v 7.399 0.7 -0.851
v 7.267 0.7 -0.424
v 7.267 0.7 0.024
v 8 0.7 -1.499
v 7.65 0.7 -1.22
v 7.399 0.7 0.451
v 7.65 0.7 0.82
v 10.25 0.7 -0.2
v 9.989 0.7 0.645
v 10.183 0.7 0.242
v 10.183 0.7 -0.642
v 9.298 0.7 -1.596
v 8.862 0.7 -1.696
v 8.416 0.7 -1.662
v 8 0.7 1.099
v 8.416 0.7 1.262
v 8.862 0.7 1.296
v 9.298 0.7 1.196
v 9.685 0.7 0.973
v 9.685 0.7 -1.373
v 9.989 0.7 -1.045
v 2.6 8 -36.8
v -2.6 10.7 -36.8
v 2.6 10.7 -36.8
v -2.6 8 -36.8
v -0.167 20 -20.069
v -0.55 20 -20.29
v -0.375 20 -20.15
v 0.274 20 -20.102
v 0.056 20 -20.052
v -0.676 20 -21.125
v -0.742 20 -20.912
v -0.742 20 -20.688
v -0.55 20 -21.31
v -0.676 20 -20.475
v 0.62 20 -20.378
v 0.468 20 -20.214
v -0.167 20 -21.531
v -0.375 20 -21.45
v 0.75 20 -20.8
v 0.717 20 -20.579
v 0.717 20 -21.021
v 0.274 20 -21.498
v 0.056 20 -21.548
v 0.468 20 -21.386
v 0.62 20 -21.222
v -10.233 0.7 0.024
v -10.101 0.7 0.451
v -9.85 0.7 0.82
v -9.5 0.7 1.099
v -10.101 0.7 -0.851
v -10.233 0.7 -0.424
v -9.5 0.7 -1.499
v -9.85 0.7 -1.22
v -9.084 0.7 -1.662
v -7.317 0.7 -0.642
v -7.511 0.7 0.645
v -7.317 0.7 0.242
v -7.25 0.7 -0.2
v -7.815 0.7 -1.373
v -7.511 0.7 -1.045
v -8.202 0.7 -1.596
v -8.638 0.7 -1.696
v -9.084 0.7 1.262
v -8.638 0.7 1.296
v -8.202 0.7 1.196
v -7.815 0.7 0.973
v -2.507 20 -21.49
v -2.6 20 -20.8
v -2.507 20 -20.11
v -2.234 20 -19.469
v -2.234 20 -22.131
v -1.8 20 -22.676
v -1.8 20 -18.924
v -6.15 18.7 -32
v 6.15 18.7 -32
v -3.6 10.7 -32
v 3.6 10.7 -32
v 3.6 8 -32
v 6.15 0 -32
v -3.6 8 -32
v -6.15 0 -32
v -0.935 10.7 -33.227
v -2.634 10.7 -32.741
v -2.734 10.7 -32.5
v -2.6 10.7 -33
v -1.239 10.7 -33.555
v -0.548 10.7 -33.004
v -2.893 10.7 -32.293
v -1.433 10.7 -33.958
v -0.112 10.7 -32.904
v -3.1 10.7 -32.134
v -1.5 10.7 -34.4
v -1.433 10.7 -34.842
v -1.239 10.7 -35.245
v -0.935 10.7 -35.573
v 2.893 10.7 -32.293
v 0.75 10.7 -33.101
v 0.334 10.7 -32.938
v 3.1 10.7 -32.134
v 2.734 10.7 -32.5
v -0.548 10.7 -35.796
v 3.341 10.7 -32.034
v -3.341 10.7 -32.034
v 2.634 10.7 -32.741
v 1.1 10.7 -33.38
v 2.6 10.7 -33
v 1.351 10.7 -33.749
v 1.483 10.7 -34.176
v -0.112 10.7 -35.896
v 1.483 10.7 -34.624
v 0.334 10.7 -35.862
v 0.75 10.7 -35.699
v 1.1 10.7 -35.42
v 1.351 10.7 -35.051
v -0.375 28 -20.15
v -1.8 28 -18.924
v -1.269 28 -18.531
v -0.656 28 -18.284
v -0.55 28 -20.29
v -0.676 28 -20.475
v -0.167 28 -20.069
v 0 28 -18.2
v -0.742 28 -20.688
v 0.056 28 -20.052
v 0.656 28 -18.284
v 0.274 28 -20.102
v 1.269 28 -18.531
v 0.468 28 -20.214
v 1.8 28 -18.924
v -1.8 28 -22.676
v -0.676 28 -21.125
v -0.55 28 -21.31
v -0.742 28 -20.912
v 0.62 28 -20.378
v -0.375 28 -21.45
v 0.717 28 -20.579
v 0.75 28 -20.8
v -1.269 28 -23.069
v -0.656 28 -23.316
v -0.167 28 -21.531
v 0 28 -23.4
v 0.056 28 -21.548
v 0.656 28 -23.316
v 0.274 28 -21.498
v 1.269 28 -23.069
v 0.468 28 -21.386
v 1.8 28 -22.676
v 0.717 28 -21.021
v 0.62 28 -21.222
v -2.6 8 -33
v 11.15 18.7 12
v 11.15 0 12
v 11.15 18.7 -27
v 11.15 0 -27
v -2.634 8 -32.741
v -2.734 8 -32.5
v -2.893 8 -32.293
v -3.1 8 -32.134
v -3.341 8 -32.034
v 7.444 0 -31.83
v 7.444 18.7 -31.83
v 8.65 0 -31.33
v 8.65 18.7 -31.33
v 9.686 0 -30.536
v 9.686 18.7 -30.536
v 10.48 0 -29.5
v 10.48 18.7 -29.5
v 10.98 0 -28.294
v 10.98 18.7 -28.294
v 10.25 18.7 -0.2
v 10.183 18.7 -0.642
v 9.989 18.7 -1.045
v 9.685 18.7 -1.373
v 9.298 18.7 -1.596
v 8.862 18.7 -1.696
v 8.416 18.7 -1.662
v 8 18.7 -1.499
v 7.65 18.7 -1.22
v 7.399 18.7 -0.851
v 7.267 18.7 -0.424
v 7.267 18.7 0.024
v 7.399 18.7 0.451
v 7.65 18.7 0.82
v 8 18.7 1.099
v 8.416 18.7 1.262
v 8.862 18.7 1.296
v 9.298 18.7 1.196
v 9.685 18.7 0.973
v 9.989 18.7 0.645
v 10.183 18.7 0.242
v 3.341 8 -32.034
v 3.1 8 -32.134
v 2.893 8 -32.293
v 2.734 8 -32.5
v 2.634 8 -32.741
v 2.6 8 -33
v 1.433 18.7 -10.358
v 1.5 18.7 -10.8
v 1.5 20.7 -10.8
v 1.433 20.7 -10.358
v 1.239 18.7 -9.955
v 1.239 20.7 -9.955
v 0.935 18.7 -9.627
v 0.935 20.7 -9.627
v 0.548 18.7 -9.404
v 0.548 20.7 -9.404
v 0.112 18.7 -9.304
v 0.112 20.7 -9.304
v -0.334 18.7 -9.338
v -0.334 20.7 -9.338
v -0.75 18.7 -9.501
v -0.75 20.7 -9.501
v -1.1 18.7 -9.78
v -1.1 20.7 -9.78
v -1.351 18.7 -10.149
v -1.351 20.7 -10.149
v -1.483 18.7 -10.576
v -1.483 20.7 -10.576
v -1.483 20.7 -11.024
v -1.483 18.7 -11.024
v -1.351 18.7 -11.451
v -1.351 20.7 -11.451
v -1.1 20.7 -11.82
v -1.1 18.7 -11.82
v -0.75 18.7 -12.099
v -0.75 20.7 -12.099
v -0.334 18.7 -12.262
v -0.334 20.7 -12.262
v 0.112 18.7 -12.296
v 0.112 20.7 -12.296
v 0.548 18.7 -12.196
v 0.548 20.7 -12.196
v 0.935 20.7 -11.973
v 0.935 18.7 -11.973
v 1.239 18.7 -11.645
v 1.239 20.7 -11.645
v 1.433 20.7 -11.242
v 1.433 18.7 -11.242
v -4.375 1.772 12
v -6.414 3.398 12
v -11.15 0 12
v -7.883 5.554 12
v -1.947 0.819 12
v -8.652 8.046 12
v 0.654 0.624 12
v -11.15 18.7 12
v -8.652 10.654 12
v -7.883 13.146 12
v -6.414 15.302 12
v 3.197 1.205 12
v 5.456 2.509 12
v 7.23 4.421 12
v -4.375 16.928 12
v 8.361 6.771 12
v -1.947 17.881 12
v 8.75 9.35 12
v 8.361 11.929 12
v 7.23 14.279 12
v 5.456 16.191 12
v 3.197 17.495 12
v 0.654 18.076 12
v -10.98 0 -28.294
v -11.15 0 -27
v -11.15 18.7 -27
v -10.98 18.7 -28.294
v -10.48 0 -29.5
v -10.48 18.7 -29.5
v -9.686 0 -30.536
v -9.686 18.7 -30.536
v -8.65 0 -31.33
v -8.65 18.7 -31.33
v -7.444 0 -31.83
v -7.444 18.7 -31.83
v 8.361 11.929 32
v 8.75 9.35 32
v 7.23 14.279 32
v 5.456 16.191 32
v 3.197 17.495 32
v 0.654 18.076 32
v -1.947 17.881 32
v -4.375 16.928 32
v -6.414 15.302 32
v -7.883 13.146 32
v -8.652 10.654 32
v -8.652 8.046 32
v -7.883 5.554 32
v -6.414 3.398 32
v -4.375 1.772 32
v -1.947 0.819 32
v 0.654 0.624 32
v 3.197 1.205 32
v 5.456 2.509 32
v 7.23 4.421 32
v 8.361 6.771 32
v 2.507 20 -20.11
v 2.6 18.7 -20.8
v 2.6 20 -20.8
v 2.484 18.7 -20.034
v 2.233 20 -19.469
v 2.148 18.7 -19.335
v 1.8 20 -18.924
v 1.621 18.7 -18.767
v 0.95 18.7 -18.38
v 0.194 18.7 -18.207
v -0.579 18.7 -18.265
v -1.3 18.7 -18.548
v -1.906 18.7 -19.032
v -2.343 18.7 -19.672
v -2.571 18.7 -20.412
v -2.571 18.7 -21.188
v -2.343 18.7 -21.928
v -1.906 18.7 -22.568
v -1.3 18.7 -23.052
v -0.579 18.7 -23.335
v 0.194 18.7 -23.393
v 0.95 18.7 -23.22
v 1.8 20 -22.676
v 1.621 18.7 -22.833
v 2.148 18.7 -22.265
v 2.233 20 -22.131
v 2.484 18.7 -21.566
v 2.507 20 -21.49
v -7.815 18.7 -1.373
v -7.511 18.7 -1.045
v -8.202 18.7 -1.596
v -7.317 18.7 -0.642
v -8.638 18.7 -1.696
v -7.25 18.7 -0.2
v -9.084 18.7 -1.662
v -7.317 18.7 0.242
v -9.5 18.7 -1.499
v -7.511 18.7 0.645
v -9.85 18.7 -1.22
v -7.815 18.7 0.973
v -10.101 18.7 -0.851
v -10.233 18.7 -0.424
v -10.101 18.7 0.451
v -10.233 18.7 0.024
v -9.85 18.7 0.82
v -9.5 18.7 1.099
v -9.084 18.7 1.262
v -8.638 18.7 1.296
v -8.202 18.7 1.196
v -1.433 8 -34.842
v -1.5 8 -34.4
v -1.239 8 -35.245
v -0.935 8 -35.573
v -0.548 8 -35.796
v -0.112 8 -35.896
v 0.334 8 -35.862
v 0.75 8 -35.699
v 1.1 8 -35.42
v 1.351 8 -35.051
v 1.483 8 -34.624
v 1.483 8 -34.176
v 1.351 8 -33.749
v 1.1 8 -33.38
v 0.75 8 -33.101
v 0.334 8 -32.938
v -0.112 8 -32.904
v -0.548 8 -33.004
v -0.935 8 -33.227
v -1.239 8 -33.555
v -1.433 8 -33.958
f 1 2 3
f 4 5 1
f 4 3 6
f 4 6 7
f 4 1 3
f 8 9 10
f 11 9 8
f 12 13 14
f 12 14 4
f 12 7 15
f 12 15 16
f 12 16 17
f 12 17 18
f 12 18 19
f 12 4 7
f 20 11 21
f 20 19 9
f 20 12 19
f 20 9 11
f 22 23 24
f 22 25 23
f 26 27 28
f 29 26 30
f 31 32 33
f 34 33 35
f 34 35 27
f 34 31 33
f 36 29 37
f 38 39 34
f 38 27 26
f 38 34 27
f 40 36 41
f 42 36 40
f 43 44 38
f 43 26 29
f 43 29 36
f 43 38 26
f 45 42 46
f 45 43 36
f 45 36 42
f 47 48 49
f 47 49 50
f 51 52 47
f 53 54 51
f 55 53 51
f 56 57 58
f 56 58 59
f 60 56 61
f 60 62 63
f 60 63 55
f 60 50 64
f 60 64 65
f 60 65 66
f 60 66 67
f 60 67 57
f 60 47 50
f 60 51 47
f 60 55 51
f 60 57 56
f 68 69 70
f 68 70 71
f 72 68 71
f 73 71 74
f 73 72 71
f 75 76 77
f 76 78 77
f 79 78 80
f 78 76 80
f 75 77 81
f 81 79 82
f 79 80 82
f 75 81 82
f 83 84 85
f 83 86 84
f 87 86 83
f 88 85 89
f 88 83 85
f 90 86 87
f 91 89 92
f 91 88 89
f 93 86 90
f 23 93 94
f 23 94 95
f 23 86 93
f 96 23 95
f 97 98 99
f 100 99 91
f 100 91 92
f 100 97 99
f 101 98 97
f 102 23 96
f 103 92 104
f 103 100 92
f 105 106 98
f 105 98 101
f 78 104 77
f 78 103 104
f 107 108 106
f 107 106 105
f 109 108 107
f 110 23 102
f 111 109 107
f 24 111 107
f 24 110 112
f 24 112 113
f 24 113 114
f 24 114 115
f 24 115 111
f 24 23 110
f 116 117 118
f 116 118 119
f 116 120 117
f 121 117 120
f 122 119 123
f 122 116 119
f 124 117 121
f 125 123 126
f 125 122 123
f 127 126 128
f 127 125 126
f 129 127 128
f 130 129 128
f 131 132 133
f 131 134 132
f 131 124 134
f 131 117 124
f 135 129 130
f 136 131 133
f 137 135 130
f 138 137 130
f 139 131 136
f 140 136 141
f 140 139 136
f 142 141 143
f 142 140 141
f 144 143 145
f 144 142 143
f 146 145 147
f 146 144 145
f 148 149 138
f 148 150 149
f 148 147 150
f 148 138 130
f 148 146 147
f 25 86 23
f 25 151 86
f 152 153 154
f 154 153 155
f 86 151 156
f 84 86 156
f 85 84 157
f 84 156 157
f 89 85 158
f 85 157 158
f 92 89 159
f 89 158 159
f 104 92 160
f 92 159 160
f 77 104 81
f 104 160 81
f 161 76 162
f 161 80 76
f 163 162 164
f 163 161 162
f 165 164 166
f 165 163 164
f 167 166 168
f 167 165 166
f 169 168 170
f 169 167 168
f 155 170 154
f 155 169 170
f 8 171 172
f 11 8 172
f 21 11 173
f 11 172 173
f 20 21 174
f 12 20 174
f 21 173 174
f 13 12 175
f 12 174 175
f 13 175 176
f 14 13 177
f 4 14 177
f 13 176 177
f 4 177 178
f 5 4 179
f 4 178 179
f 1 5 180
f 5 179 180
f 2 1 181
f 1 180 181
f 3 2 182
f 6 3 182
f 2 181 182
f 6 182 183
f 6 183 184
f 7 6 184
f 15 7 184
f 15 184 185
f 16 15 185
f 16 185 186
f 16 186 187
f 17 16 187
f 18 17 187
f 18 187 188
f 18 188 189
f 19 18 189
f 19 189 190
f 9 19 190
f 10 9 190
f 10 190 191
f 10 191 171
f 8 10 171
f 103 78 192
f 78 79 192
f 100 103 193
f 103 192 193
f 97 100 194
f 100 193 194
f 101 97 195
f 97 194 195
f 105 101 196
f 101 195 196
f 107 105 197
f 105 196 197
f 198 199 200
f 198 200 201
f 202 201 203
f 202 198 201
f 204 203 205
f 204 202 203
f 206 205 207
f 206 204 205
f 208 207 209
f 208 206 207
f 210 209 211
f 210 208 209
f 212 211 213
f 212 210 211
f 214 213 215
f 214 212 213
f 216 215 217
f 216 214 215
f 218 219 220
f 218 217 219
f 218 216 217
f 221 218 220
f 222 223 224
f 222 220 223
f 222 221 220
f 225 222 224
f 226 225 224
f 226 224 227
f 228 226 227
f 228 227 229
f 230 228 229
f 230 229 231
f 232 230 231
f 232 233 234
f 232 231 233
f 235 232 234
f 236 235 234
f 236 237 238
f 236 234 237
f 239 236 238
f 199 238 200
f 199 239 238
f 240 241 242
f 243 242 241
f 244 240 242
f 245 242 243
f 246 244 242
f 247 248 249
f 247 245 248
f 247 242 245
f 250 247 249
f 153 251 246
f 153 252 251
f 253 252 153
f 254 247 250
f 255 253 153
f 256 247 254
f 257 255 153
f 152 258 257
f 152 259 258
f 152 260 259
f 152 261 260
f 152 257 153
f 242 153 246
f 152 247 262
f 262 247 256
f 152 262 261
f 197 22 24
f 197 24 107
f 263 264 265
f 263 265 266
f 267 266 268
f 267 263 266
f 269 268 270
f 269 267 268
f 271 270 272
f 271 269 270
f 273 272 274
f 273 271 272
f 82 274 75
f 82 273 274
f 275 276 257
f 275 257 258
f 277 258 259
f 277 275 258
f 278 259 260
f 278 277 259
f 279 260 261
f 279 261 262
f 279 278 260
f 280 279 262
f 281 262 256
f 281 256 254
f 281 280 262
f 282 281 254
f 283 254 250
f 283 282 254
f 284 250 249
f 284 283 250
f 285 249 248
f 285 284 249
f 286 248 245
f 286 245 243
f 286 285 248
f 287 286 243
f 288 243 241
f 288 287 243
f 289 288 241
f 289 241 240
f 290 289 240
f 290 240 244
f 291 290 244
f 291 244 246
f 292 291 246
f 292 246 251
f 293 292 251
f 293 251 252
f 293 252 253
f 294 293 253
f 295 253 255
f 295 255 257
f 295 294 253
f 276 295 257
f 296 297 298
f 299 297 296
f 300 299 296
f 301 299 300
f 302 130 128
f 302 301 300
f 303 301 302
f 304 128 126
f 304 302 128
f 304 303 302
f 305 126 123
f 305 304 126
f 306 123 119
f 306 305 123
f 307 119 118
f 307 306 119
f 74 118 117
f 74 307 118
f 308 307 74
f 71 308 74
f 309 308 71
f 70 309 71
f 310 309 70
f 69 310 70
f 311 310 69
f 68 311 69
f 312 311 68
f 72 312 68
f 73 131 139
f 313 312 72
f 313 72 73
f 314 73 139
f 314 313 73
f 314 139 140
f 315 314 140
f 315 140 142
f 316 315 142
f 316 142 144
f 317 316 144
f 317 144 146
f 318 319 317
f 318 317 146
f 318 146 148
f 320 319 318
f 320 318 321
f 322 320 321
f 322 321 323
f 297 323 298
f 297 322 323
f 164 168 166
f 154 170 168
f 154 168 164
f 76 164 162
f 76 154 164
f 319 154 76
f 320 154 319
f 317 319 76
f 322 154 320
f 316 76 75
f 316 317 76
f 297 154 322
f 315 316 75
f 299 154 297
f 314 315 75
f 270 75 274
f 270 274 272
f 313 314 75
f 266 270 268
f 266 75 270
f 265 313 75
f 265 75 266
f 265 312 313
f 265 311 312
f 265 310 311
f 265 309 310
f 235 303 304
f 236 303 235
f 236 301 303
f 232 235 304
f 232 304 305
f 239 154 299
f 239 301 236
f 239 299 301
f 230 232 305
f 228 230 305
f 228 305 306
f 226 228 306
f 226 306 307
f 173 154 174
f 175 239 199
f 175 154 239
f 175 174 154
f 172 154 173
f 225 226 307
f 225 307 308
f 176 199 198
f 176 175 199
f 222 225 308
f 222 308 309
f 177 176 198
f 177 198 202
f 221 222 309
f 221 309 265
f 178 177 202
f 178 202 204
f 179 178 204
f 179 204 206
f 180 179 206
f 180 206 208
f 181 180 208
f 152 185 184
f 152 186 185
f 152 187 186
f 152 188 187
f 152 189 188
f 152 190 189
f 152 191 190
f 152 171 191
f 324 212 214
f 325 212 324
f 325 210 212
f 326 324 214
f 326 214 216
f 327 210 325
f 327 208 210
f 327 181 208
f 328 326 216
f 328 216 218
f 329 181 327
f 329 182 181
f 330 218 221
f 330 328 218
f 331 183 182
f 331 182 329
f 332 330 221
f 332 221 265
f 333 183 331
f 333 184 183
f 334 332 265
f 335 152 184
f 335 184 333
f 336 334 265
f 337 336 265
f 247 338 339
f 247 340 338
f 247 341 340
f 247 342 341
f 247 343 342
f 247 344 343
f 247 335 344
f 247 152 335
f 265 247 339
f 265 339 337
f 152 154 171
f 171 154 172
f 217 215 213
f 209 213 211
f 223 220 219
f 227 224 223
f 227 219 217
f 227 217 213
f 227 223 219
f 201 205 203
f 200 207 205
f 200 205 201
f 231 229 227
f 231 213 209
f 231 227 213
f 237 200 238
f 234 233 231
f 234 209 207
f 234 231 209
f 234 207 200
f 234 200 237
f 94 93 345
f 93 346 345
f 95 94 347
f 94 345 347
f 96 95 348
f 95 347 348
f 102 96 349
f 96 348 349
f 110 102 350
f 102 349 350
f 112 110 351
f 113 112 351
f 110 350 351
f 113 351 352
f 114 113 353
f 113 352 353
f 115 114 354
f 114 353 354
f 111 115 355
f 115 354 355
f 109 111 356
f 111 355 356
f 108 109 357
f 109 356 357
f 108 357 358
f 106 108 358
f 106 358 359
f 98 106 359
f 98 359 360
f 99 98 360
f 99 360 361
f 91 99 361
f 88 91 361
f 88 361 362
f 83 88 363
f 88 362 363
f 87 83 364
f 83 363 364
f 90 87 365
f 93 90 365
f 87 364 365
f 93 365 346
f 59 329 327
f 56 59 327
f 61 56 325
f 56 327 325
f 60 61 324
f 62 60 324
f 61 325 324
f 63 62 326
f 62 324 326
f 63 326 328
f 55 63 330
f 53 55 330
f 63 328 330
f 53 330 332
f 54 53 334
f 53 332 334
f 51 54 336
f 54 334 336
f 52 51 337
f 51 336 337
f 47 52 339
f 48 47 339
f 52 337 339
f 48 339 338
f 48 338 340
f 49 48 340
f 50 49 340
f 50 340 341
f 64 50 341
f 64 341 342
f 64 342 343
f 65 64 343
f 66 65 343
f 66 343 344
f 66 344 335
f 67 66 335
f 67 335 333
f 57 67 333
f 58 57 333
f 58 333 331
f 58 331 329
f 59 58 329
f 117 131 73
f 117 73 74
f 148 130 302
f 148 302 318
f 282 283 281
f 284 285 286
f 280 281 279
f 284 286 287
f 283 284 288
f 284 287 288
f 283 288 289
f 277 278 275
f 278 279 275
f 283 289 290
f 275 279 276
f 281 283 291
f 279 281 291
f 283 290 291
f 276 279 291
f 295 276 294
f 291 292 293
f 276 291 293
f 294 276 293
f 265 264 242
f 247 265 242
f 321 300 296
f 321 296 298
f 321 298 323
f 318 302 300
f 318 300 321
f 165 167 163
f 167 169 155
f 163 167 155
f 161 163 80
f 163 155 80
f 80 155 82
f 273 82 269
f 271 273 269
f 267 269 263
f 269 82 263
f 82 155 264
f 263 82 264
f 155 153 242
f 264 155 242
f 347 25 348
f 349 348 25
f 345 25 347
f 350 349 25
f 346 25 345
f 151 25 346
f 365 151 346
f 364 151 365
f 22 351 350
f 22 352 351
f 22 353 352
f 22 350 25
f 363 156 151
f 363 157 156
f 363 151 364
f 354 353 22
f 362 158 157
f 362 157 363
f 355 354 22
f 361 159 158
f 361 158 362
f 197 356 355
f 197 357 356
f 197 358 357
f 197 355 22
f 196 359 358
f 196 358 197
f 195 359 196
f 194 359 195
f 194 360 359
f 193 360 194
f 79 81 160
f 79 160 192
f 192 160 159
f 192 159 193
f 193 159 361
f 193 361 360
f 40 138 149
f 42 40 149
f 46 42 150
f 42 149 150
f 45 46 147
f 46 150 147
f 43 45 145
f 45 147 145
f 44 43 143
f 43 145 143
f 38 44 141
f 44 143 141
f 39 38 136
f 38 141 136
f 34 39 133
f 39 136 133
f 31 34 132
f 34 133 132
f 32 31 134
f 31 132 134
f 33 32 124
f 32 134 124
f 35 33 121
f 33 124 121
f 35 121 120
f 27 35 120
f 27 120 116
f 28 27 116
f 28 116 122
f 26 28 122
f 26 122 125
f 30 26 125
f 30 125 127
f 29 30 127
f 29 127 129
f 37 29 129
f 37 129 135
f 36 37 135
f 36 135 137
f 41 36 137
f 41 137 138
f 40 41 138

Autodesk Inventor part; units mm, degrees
ref_plane "YZ Plane" through (0, 0, 0) normal (1, 0, 0) x (0, 1, 0)
ref_plane "XZ Plane" through (0, 0, 0) normal (0, 1, 0) x (-1, 0, 0)
ref_plane "XY Plane" through (0, 0, 0) normal (0, 0, 1) x (1, 0, 0)
sketch "Sketch1" plane through (0, 0, 0) normal (0, 1, 0) x (-1, 0, 0)
  line L0 (11.15, 32) -> (-11.15, 32)
  line L1 (-11.15, 32) -> (-11.15, -27)
  line L2 (11.15, -27) -> (11.15, 32)
  line L3 (11.15, 32) -> (-11.15, -32) construction
  line L4 (-11.15, 32) -> (11.15, -32) construction
  arc A0 (6.15, -32) -> (11.15, -27) centre (6.15, -27) ccw
  arc A1 (-11.15, -27) -> (-6.15, -32) centre (-6.15, -27) ccw
  line L5 (2.5547, -34.4) -> (0, -34.4) construction
  circle A2 centre (0, -34.4) radius 1.5
  line L6 (2.6003, -36.8) -> (-2.6003, -36.8)
  line L7 (-2.6003, -36.8) -> (-2.6003, -33)
  line L8 (2.5547, -32) -> (2.6003, -32)
  line L9 (2.6003, -33) -> (2.6003, -36.8)
  line L10 (2.6003, -36.8) -> (-2.6003, -32) construction
  line L11 (-2.6003, -36.8) -> (1.1023, -33.3826) construction
  line L12 (-6.15, -32) -> (-3.6003, -32)
  line L13 (3.6003, -32) -> (6.15, -32)
  arc A3 (3.6003, -32) -> (2.6003, -33) centre (3.6003, -33) ccw
  arc A4 (-2.6003, -33) -> (-3.6003, -32) centre (-3.6003, -33) ccw
  point P0 (0, 0)
  point P1 (0, -32)
  dimension "d19" = 3
  dimension "d14" = 22.3
  dimension "d15" = 64
  dimension "d16" = 5
  dimension "d17" = 5
  dimension "d18" = 2.4
  dimension "d20" = 1
extrude "Extrusion5" add sketch "Sketch1" along normal blind 18.7
sketch "Sketch5" plane through (0, 18.7, 0) normal (0, 1, 0) x (1, 0, 0)
  arc A0 (-6.15, 32) -> (-11.15, 27) centre (-6.15, 27) ccw construction
  line L0 (-11.15, 27) -> (-11.15, -32) construction
  line L1 (-11.15, -32) -> (11.15, -32) construction
  line L2 (11.15, -32) -> (11.15, 27) construction
  arc A1 (11.15, 27) -> (6.15, 32) centre (6.15, 27) ccw construction
  line L3 (6.15, 32) -> (3.6003, 32) construction
  arc A2 (3.6003, 32) -> (2.6003, 33) centre (3.6003, 33) ccw construction
  line L4 (2.6003, 33) -> (2.6003, 36.8) construction
  line L5 (2.6003, 36.8) -> (-2.6003, 36.8) construction
  line L6 (-2.6003, 36.8) -> (-2.6003, 33) construction
  arc A3 (-2.6003, 33) -> (-3.6003, 32) centre (-3.6003, 33) ccw construction
  line L7 (-3.6003, 32) -> (-6.15, 32) construction
  circle A4 centre (0, 34.4) radius 1.5 construction
  line L8 (-3.6003, 32) -> (-6.15, 32) construction
  line L9 (-6.15, 32) -> (-6.15, 20.8) construction
  circle A5 centre (0, 20.8) radius 2.6
  line L10 (0, 0) -> (0, 39.0389) construction
  line L11 (8.75, 32) -> (-8.75, 32) construction
  line L12 (-4.8752, 32) -> (4.8752, 32) construction
  line L13 (8.75, 32) -> (8.75, 0.2) construction
  circle A6 centre (8.75, 0.2) radius 1.5
  line L14 (-8.75, 32) -> (-8.75, 0.2) construction
  circle A7 centre (-8.75, 0.2) radius 1.5
  point P0 (0, 32)
  dimension "d23" = 11.2
  dimension "d24" = 5.2
  dimension "d29" = 17.5
  dimension "d30" = 31.8
  dimension "d31" = 3
  dimension "d32" = 31.8
  dimension "d33" = 3
extrude "Extrusion6" cut sketch "Sketch5" against normal blind 18 contours A6 | A7
extrude "Extrusion7" add sketch "Sketch5" along normal blind 9.3 contours A5
sketch "Sketch6" plane through (0, 18.7, 0) normal (0, 1, 0) x (1, 0, 0)
  circle A0 centre (0, 20.8) radius 2.6 construction
  line L0 (0, 20.8) -> (0, 10.8) construction
  circle A1 centre (0, 10.8) radius 1.5
  point P0 (0, 0)
  dimension "d38" = 10
  dimension "d39" = 3
extrude "Extrusion8" add sketch "Sketch6" along normal blind 2
sketch "Sketch7" plane through (0, 28, -20.8) normal (0, 1, 0) x (1, 0, 0)
  circle A0 centre (0, 0) radius 2.6 construction
  line L0 (1.8, -1.8762) -> (1.8, 1.8762)
  line L1 (-1.8, 1.8762) -> (-1.8, -1.8762)
  line L2 (-1.3648, -2.213) -> (1.3648, 2.213) construction
  line L3 (1.3648, -2.213) -> (-1.3648, 2.213) construction
  arc A1 (-1.8, 1.8762) -> (-1.8, -1.8762) centre (0, 0) ccw
  circle A2 centre (0, 0) radius 2.6 projected
  arc A3 (1.8, -1.8762) -> (1.8, 1.8762) centre (0, 0) ccw
  point P0 (0, -20.8)
extrude "Extrusion9" cut sketch "Sketch7" against normal blind 8 contours L0 A2 | A1 L1
sketch "Sketch8" plane through (0, 28, 0) normal (0, 1, 0) x (1, 0, 0)
  line L0 (-1.8, 22.6762) -> (-1.8, 18.9238) construction
  arc A0 (-1.8, 18.9238) -> (1.8, 18.9238) centre (0, 20.8) ccw construction
  line L1 (1.8, 18.9238) -> (1.8, 22.6762) construction
  arc A1 (1.8, 22.6762) -> (-1.8, 22.6762) centre (0, 20.8) ccw construction
  circle A2 centre (0, 20.8) radius 0.75
  point P0 (0, 0)
  dimension "d45" = 1.5
extrude "Extrusion10" cut sketch "Sketch8" against normal blind 8
sketch "Sketch9" plane through (-11.15, 0, 32) normal (0, 0, 1) x (1, 0, 0)
  line L0 (0, 0) -> (22.3, 0) construction
  line L1 (22.3, 0) -> (22.3, 18.7) construction
  line L2 (0, 18.7) -> (22.3, 18.7) construction
  line L3 (0, 0) -> (0, 18.7) construction
  circle A0 centre (11.15, 9.35) radius 8.75
  line L4 (0, 0) -> (0, 18.7) projected
  line L5 (0, 0) -> (22.3, 0)
  line L6 (22.3, 0) -> (22.3, 18.7)
  line L7 (22.3, 18.7) -> (0, 18.7)
  line L8 (0, 18.7) -> (0, 0)
  point P0 (11.15, 0)
  dimension "d48" = 17.5
extrude "Extrusion11" cut sketch "Sketch9" against normal blind 20
sketch "Sketch10" plane through (0, 0, 0) normal (0, -1, 0) x (1, 0, 0)
  line L0 (11.15, 12) -> (-11.15, 12) projected
  line L1 (-11.15, -27) -> (-11.15, 12) projected
  arc A0 (-11.15, -27) -> (-6.15, -32) centre (-6.15, -27) ccw projected
  line L2 (-3.6003, -32) -> (-6.15, -32) projected
  arc A1 (-2.6003, -33) -> (-3.6003, -32) centre (-3.6003, -33) ccw projected
  line L3 (-2.6003, -36.8) -> (-2.6003, -33) projected
  line L4 (2.6003, -36.8) -> (-2.6003, -36.8) projected
  line L5 (2.6003, -33) -> (2.6003, -36.8) projected
  arc A2 (3.6003, -32) -> (2.6003, -33) centre (3.6003, -33) ccw projected
  line L6 (6.15, -32) -> (3.6003, -32) projected
  arc A3 (6.15, -32) -> (11.15, -27) centre (6.15, -27) ccw projected
  line L7 (11.15, 12) -> (11.15, -27) projected
  circle A4 centre (0, -34.4) radius 1.5 projected
  arc A5 (-2.6003, -33) -> (-3.6003, -32) centre (-3.6003, -33) ccw projected
  line L8 (-3.6003, -32) -> (3.6003, -32)
  point P0 (0, 0)
extrude "Extrusion12" cut sketch "Sketch10" against normal blind 8 contours A2 L5 L4 L3 A1 L8
sketch "Sketch11" plane through (0, 18.7, 0) normal (0, 1, 0) x (1, 0, 0)
  circle A0 centre (0, 34.4) radius 1.5 projected
  line L0 (-11.15, -12) -> (11.15, -12) projected
  line L1 (11.15, -12) -> (11.15, 27) projected
  arc A1 (11.15, 27) -> (6.15, 32) centre (6.15, 27) ccw projected
  line L2 (6.15, 32) -> (3.6003, 32) projected
  arc A2 (2.6003, 33) -> (3.6003, 32) centre (3.6003, 33) ccw projected
  line L3 (2.6003, 33) -> (2.6003, 36.8) projected
  line L4 (2.6003, 36.8) -> (-2.6003, 36.8) projected
  line L5 (-2.6003, 36.8) -> (-2.6003, 33) projected
  arc A3 (-3.6003, 32) -> (-2.6003, 33) centre (-3.6003, 33) ccw projected
  line L6 (-3.6003, 32) -> (-6.15, 32) projected
  arc A4 (-6.15, 32) -> (-11.15, 27) centre (-6.15, 27) ccw projected
  line L7 (-11.15, 27) -> (-11.15, -12) projected
  circle A5 centre (-8.75, 0.2) radius 1.5 projected
  circle A6 centre (8.75, 0.2) radius 1.5 projected
  circle A7 centre (0, 20.8) radius 2.6 projected
  circle A8 centre (0, 10.8) radius 1.5 projected
  arc A9 (-3.6003, 32) -> (-2.6003, 33) centre (-3.6003, 33) ccw projected
  line L8 (-3.6003, 32) -> (3.6003, 32)
  point P0 (0, 0)
extrude "Extrusion13" cut sketch "Sketch11" against normal blind 8 contours A3 L5 L4 L3 A2 L8
properties part number "motor_placeholder"
